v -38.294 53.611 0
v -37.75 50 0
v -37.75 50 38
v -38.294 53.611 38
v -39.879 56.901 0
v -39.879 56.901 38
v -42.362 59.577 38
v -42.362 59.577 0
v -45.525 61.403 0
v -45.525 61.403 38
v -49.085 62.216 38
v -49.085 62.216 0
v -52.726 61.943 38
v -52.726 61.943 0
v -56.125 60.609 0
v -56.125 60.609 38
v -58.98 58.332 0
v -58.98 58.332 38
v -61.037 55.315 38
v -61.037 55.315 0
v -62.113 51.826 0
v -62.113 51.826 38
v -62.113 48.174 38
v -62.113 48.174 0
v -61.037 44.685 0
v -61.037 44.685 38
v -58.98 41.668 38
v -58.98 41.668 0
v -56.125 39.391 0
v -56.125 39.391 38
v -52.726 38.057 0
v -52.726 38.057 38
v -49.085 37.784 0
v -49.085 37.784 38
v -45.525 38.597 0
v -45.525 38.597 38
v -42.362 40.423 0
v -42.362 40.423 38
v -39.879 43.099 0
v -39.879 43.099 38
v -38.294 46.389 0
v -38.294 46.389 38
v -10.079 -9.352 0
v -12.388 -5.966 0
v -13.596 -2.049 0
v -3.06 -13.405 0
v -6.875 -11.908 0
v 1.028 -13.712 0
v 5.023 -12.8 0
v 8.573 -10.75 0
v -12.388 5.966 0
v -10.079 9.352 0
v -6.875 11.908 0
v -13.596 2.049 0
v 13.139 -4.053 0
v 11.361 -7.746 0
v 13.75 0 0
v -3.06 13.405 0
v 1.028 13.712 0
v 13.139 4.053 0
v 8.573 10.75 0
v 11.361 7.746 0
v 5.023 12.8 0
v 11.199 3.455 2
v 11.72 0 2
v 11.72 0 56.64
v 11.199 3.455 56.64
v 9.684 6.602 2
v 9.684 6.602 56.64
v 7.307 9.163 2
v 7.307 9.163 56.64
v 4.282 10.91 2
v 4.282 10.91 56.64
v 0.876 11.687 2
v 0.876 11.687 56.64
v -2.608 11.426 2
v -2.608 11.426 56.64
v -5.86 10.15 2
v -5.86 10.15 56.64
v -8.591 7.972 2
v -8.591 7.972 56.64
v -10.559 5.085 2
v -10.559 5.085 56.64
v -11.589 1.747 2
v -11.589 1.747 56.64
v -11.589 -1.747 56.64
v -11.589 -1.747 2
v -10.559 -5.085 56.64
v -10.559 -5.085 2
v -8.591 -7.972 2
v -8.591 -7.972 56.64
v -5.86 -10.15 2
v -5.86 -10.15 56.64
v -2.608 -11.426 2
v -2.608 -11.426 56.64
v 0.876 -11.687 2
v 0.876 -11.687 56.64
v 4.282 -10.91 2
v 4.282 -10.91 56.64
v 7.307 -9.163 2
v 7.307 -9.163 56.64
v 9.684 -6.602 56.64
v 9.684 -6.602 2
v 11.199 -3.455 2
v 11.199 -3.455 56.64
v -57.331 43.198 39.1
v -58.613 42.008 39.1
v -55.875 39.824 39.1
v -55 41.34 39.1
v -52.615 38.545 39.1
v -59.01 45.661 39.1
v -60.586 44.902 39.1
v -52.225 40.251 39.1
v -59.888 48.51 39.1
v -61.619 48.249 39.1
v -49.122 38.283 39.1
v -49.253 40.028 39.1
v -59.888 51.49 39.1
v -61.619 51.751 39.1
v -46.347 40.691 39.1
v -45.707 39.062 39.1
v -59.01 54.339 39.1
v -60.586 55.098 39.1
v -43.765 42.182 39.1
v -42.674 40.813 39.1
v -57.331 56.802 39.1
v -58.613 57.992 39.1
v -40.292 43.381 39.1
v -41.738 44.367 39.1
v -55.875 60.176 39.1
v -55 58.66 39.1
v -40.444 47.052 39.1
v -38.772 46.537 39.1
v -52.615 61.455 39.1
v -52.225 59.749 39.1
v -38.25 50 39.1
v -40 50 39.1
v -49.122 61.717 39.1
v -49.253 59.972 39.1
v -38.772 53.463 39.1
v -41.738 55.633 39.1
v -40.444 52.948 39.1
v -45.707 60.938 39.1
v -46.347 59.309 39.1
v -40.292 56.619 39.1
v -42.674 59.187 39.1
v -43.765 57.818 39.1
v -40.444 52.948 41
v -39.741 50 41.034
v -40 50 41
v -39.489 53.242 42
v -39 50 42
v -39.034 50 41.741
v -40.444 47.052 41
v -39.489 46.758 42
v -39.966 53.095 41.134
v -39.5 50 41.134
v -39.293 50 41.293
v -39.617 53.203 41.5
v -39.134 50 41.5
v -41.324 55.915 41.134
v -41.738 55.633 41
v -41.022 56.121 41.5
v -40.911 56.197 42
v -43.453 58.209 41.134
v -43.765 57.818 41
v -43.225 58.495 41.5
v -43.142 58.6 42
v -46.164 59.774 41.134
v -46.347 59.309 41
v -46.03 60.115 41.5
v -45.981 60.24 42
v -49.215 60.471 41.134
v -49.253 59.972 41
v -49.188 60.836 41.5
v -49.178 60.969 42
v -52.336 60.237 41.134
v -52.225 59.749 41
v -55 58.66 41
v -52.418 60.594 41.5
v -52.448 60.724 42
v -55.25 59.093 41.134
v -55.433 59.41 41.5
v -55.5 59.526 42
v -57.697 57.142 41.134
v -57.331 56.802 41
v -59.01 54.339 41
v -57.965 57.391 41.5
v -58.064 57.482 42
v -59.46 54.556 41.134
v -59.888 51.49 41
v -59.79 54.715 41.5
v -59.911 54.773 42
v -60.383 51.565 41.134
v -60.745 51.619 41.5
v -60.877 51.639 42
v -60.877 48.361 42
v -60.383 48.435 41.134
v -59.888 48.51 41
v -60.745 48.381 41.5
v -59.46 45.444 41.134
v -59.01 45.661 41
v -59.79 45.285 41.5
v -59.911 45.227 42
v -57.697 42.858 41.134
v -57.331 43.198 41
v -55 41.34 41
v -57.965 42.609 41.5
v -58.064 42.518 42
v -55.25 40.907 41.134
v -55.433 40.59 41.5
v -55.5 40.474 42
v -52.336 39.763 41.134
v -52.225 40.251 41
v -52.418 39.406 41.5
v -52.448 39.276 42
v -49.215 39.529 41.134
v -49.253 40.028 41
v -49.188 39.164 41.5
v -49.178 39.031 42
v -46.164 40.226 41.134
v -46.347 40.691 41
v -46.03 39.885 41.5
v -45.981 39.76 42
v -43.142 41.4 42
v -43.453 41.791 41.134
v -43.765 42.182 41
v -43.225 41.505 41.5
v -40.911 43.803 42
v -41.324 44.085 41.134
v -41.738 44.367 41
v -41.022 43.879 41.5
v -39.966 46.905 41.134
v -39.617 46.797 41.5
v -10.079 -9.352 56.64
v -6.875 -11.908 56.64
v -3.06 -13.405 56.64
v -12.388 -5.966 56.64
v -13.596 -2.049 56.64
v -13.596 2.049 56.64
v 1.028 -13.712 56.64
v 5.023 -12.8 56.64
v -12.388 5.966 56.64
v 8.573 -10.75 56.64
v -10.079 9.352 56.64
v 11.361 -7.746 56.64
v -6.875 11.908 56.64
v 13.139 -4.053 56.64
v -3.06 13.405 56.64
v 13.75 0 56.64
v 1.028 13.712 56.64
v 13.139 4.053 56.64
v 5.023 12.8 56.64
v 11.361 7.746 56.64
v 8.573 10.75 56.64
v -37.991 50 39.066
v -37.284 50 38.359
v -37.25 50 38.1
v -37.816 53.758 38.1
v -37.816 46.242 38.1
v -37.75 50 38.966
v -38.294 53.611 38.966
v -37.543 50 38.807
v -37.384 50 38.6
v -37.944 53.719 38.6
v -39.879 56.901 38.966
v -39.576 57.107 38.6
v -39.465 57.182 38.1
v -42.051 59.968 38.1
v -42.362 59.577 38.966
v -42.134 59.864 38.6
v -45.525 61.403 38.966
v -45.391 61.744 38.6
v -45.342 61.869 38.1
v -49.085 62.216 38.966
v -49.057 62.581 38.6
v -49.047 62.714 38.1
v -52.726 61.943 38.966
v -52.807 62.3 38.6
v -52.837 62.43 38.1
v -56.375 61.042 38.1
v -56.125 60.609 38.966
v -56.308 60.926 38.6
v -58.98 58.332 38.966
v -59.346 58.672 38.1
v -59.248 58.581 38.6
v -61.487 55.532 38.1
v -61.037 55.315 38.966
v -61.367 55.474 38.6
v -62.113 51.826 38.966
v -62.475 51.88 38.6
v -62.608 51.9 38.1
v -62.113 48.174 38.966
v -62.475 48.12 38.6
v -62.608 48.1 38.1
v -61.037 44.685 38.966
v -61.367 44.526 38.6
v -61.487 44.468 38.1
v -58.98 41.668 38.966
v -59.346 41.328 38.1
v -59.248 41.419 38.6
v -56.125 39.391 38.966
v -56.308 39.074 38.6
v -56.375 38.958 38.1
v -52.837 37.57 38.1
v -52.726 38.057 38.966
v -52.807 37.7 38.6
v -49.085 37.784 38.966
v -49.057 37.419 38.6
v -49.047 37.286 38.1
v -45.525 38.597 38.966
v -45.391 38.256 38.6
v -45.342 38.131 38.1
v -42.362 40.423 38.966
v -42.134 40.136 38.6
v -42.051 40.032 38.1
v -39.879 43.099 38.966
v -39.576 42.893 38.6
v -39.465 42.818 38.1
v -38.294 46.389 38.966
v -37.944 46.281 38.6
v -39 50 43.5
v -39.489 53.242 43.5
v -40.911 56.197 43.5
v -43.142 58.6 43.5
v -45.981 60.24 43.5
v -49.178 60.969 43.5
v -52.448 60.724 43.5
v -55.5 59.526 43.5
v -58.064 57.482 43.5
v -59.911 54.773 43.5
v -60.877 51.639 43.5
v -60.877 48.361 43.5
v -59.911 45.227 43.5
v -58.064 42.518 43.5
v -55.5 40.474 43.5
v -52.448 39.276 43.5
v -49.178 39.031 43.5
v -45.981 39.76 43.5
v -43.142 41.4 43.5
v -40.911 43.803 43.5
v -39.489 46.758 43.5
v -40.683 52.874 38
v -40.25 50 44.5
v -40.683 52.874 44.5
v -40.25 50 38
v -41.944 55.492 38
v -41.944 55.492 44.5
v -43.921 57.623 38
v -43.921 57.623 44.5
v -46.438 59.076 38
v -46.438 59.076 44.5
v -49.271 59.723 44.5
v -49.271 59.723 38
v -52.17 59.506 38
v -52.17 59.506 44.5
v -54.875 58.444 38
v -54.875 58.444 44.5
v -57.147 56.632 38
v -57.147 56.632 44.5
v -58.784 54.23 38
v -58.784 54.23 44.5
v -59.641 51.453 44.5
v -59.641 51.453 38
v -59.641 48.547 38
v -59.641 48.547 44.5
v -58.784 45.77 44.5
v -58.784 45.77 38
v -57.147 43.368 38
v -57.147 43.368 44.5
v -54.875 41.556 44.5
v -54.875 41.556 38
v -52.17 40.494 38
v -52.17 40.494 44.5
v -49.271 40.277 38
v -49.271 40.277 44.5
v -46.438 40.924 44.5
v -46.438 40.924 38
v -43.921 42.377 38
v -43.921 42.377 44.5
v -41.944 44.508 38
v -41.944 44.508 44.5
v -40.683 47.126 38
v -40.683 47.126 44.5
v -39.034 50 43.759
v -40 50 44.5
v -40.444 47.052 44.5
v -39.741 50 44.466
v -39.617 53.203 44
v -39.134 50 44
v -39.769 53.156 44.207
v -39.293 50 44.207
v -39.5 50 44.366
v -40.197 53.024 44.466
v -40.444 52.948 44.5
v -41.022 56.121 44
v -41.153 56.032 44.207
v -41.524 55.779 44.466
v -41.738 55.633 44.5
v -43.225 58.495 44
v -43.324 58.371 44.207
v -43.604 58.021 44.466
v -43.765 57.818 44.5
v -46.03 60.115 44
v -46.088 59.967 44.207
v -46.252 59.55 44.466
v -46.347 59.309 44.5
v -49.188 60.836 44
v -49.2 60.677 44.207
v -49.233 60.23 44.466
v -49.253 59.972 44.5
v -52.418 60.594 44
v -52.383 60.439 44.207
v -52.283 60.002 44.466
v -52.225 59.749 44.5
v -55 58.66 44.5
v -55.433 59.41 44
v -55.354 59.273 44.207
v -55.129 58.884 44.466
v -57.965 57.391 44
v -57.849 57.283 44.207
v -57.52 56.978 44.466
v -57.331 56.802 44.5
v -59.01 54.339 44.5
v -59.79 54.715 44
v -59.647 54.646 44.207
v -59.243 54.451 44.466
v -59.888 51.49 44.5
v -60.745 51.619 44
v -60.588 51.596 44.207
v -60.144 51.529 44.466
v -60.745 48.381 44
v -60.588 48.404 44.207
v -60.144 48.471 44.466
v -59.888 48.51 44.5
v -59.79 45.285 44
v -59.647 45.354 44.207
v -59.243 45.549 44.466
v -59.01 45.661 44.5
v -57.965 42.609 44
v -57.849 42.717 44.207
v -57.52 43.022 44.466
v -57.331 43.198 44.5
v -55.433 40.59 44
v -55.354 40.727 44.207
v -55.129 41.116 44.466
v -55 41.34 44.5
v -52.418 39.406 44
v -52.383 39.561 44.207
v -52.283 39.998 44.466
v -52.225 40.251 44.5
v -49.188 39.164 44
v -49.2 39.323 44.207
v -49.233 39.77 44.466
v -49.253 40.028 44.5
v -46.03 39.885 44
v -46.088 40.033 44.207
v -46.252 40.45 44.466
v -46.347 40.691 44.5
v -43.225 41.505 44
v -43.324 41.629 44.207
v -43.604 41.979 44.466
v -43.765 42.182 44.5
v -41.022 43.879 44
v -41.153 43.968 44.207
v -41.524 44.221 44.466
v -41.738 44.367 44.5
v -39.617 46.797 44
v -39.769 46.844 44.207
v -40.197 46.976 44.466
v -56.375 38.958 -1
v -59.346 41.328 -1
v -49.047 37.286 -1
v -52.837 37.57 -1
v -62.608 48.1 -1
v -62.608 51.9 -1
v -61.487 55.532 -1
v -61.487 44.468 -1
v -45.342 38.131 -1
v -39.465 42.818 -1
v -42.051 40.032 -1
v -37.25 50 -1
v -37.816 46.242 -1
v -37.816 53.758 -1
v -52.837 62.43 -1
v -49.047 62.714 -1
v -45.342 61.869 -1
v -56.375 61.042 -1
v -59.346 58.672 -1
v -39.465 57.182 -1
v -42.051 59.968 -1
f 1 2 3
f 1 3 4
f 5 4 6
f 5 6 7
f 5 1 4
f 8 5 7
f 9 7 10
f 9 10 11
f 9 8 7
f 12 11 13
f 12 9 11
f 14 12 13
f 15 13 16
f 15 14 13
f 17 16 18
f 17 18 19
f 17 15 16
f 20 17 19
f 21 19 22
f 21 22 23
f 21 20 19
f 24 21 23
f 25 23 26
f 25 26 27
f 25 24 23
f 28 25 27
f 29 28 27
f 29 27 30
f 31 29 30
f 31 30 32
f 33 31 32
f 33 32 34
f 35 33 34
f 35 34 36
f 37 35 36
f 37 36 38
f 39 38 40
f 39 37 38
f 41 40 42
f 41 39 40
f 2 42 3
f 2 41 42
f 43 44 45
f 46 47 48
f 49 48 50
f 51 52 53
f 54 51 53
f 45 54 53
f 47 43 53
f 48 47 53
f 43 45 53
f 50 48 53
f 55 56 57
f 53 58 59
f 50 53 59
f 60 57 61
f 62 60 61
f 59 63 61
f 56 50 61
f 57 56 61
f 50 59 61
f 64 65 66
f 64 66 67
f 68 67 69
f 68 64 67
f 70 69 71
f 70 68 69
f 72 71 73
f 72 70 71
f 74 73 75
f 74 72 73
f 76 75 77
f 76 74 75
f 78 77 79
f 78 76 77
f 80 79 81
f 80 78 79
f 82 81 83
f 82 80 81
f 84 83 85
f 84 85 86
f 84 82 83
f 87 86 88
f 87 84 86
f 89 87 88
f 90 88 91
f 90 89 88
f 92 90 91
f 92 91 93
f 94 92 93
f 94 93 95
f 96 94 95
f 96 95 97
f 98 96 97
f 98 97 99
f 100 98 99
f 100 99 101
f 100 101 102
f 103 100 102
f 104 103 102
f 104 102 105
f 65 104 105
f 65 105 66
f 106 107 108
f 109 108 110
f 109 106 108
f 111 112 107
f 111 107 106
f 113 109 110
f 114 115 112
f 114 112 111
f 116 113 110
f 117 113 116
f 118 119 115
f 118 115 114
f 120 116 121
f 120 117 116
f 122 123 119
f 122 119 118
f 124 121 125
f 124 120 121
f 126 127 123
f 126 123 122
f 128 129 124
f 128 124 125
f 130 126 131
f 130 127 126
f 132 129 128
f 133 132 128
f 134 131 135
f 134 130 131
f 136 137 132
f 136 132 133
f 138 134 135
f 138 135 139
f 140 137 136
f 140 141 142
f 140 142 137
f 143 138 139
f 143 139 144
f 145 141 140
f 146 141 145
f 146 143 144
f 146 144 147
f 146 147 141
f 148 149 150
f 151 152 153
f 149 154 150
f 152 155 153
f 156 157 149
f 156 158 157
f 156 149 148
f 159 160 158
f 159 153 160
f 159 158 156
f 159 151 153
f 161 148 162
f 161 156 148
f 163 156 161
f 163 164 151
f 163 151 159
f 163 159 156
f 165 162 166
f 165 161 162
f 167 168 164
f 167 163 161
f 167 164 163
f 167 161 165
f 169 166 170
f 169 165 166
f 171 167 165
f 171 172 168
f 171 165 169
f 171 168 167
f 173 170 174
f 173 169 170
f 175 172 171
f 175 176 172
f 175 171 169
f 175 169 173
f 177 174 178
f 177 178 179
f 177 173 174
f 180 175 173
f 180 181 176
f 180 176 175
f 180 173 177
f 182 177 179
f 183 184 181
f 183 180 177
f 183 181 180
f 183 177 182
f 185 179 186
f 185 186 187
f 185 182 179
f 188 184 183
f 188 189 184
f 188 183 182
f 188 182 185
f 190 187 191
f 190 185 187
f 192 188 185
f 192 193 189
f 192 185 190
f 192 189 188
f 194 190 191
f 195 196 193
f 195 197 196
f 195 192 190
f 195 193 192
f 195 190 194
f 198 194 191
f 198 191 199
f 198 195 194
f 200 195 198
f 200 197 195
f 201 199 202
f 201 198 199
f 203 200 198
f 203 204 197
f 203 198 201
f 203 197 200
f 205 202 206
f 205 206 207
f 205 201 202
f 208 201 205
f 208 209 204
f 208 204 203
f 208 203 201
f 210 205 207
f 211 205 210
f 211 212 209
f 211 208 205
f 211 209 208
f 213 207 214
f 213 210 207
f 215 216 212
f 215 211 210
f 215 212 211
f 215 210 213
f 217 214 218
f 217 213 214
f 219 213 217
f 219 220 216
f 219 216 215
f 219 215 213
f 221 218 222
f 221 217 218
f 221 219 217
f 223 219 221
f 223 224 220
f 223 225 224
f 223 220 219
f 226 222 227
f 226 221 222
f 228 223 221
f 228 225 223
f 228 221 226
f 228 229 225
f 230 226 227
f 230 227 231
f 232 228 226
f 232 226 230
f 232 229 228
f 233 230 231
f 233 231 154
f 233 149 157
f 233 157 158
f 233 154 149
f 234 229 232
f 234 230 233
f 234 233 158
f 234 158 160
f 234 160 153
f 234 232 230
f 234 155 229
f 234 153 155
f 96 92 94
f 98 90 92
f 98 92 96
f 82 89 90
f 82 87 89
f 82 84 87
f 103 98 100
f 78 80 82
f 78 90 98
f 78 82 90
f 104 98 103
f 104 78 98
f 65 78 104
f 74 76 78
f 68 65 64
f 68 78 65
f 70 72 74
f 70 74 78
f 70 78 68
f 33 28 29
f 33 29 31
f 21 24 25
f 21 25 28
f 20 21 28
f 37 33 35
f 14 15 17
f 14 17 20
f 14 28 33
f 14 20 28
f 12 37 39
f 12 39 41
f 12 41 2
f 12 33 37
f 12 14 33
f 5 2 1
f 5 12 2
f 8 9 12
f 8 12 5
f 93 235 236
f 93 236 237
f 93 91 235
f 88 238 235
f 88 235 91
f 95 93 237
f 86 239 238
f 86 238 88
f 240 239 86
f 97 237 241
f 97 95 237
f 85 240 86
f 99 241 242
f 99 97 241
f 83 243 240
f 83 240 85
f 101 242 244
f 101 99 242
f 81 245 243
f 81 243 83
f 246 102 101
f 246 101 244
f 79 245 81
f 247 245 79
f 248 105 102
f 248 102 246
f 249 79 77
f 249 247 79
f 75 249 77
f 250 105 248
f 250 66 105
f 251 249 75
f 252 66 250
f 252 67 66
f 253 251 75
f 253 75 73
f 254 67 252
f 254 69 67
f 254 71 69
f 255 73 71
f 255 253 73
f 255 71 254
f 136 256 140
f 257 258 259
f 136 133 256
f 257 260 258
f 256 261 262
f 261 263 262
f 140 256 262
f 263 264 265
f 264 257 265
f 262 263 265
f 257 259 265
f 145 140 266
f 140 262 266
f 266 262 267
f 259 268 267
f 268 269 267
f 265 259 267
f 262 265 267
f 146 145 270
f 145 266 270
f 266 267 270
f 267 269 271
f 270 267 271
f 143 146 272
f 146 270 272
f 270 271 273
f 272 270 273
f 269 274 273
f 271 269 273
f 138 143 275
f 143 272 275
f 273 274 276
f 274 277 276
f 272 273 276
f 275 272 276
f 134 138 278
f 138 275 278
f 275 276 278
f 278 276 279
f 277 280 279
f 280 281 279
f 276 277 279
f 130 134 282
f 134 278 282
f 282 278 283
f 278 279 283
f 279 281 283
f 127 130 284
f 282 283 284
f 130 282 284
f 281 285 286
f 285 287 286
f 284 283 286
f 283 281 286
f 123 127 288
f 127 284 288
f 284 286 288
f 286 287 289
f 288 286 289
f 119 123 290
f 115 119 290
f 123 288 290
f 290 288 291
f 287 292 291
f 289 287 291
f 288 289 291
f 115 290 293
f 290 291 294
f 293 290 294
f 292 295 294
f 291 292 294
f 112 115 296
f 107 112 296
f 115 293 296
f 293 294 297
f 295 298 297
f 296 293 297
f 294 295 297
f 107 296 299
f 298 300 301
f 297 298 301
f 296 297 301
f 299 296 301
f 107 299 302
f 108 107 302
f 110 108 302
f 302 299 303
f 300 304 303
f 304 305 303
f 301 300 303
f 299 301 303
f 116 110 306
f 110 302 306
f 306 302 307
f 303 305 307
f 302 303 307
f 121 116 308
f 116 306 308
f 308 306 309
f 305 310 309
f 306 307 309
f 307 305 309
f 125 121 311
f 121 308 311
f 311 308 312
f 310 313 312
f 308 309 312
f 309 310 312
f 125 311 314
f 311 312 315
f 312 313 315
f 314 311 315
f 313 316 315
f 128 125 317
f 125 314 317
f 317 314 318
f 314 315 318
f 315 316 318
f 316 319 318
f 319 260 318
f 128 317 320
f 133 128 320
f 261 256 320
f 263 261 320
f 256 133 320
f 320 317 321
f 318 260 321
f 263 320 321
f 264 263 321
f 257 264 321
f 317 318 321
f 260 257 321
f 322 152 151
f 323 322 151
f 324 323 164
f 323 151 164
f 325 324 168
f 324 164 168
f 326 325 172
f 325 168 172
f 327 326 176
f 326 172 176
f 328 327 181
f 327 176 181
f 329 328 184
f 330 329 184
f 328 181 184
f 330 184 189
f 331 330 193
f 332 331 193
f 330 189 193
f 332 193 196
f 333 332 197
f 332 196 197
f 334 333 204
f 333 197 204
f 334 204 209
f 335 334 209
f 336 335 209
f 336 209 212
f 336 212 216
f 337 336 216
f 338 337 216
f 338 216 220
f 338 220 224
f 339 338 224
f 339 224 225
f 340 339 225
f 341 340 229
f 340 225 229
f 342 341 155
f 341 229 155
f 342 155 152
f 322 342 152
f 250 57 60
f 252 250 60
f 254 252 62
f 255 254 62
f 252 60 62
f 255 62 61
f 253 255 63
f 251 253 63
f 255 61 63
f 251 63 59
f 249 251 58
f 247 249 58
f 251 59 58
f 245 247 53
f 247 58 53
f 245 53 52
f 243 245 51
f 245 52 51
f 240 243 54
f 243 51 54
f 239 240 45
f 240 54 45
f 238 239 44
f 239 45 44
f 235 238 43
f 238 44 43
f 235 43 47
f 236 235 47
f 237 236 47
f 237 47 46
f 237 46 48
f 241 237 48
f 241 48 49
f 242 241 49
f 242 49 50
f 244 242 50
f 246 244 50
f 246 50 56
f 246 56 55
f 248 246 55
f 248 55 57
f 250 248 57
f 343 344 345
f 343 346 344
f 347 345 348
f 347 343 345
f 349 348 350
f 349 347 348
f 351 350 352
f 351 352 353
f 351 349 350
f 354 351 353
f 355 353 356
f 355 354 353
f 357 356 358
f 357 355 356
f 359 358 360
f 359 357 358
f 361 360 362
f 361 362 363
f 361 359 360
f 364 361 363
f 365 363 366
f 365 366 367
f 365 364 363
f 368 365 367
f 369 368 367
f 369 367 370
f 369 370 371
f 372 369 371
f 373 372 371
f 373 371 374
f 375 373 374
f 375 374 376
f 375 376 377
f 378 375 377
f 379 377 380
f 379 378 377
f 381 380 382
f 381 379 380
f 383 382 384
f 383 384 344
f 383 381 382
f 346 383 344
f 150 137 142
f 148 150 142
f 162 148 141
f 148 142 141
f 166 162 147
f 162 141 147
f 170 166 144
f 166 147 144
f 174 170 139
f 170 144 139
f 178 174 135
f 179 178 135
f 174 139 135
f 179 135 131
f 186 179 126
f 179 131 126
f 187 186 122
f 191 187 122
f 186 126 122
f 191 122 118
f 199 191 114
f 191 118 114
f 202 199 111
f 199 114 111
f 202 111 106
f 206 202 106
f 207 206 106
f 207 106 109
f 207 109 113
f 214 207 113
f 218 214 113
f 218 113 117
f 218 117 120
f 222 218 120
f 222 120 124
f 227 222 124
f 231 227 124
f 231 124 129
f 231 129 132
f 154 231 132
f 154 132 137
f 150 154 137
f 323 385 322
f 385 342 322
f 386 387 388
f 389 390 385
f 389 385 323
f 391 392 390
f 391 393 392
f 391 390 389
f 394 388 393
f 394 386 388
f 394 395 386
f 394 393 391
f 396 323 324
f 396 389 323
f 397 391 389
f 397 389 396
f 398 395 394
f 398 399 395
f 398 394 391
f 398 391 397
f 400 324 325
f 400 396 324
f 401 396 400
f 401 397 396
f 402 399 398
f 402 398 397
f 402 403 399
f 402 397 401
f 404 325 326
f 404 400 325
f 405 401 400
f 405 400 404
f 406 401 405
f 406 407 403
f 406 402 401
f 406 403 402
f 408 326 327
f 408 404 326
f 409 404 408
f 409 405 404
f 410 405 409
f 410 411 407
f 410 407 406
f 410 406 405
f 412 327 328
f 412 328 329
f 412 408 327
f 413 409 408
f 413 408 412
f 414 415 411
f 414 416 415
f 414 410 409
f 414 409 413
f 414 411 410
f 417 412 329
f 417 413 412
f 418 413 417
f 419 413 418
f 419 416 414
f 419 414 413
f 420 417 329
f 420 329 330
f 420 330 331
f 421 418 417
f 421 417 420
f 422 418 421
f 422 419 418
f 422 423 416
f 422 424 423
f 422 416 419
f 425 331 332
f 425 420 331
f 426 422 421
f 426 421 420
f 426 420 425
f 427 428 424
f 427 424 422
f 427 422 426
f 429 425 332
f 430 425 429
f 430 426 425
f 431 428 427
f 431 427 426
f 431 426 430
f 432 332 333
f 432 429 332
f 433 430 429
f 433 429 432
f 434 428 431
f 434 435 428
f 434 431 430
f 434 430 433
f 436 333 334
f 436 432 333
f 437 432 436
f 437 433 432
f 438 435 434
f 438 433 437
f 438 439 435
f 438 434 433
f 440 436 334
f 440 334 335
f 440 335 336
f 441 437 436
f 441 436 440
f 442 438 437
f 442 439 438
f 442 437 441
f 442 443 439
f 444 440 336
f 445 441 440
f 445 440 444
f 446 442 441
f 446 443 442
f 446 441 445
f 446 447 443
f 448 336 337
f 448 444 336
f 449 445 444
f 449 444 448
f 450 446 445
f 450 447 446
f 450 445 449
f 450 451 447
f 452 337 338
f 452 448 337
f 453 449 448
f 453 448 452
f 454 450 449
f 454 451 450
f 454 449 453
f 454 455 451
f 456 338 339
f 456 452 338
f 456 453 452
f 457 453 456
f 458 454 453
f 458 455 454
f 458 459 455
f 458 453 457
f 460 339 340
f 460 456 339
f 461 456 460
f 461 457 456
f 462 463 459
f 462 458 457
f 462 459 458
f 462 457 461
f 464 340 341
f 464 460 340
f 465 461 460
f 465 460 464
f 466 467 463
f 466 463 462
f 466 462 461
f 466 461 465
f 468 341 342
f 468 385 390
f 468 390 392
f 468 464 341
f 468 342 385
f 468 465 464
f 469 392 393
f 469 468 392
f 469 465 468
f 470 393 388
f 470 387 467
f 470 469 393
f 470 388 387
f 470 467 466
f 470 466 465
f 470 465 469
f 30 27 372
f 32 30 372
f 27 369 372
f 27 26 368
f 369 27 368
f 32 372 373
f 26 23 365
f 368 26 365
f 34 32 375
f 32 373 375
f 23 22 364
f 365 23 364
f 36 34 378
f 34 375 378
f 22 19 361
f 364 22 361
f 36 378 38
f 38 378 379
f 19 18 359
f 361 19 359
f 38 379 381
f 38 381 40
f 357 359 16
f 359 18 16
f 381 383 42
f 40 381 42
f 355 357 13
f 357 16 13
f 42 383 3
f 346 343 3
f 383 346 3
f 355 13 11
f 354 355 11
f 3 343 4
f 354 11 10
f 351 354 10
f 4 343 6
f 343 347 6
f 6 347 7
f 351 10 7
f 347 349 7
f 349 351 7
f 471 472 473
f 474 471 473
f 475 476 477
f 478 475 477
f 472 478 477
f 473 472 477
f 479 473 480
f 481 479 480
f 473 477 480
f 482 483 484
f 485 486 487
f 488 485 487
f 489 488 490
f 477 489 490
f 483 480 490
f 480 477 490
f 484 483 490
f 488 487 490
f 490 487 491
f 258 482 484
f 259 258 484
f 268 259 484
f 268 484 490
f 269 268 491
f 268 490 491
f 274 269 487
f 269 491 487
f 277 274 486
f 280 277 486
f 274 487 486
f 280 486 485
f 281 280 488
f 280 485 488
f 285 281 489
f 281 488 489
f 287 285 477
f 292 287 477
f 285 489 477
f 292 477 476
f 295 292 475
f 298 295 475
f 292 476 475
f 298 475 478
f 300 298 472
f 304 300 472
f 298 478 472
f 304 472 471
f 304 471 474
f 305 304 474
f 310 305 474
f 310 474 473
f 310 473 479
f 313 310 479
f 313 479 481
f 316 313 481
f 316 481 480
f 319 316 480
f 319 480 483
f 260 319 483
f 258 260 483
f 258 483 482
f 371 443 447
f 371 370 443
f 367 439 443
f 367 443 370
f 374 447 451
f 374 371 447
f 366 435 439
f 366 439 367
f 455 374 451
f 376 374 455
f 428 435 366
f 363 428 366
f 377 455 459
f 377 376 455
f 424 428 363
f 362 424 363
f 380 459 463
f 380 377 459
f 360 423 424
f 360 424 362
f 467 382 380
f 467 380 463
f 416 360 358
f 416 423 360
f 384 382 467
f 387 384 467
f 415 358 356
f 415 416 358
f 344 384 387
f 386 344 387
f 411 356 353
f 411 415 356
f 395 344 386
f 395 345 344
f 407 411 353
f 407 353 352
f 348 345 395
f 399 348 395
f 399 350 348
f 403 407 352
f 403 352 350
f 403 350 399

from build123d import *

# Parameters (mm, degrees)
F0_R          = 13.75
F0_R_2        = 11.72
F1_DEPTH      = 2
F2_DEPTH      = 56.64
F3_R          = 12.75
F3_R_2        = 12.25
F4_DEPTH      = 38
F4_DEPTH_BACK = 1
F5_DEPTH      = 1
F6_R          = 12.75
F6_R_2        = 10
F6_R_3        = 9.75
F7_DEPTH      = 1.1
F8_DEPTH      = 3
F9_R          = 11
F9_R_2        = 10
F9_R_3        = 9.75
F10_DEPTH     = 3.5
F11_R         = 1
F12_R         = 0.99999


# Not quite as in the source:
# - a fillet or chamfer is up to 0.001 mm smaller than in the source, because OpenCascade refuses the exact size


with BuildPart() as f1:
    # F0 (on Top) → F1 (new body)
    with BuildSketch(Plane.XY):
        Circle(F0_R)
        Circle(F0_R_2, mode=Mode.SUBTRACT)
        Circle(F0_R_2)
    extrude(amount=F1_DEPTH)

    # F0 (on Top) → F2 (join)
    with BuildSketch(Plane.XY):
        Circle(F0_R)
        Circle(F0_R_2, mode=Mode.SUBTRACT)
    extrude(amount=F2_DEPTH)


with BuildPart() as f4:
    # F3 (on Top) → F4 (new body, two sides)
    with BuildSketch(Plane.XY) as f4_sk:
        with Locations((-50, 50)):
            Circle(F3_R)
        with Locations((-50, 50)):
            Circle(F3_R_2, mode=Mode.SUBTRACT)
    extrude(amount=F4_DEPTH)
    extrude(f4_sk.sketch, amount=-F4_DEPTH_BACK)

    # F3 (on Top) → F5 (join)
    with BuildSketch(Plane.XY):
        with Locations((-50, 50)):
            Circle(F3_R_2)
    extrude(amount=-F5_DEPTH)

    # F6 (on face) → F7 (join)
    with BuildSketch(Plane.XY.offset(38)):
        with Locations((-50, 50)):
            Circle(F6_R)
        with Locations((-50, 50)):
            Circle(F6_R_2, mode=Mode.SUBTRACT)
        with Locations((-50, 50)):
            Circle(F6_R_2)
        with Locations((-50, 50)):
            Circle(F6_R_3, mode=Mode.SUBTRACT)
    extrude(amount=F7_DEPTH)

    # F6 (on face) → F8 (join)
    with BuildSketch(Plane.XY.offset(38)):
        with Locations((-50, 50)):
            Circle(F6_R_2)
        with Locations((-50, 50)):
            Circle(F6_R_3, mode=Mode.SUBTRACT)
    extrude(amount=F8_DEPTH)

    # F9 (on face) → F10 (join)
    with BuildSketch(Plane.XY.offset(41)):
        with Locations((-50, 50)):
            Circle(F9_R)
        with Locations((-50, 50)):
            Circle(F9_R_2, mode=Mode.SUBTRACT)
        with Locations((-50, 50)):
            Circle(F9_R_2)
        with Locations((-50, 50)):
            Circle(F9_R_3, mode=Mode.SUBTRACT)
    extrude(amount=F10_DEPTH)

    # F11
    f11_edges = [f4.edges().sort_by_distance(p)[0] for p in [
        (-62.75, 50, 39.1),
    ]]
    fillet(f11_edges, radius=F11_R)

    # F12 (radius 1 in the source; OpenCascade refuses exactly that, so slightly less here)
    f12_edges = [f4.edges().sort_by_distance(p)[0] for p in [
        (-61, 50, 41),
        (-61, 50, 44.5),
    ]]
    fillet(f12_edges, radius=F12_R)


solid = Compound([f1.part, f4.part])
